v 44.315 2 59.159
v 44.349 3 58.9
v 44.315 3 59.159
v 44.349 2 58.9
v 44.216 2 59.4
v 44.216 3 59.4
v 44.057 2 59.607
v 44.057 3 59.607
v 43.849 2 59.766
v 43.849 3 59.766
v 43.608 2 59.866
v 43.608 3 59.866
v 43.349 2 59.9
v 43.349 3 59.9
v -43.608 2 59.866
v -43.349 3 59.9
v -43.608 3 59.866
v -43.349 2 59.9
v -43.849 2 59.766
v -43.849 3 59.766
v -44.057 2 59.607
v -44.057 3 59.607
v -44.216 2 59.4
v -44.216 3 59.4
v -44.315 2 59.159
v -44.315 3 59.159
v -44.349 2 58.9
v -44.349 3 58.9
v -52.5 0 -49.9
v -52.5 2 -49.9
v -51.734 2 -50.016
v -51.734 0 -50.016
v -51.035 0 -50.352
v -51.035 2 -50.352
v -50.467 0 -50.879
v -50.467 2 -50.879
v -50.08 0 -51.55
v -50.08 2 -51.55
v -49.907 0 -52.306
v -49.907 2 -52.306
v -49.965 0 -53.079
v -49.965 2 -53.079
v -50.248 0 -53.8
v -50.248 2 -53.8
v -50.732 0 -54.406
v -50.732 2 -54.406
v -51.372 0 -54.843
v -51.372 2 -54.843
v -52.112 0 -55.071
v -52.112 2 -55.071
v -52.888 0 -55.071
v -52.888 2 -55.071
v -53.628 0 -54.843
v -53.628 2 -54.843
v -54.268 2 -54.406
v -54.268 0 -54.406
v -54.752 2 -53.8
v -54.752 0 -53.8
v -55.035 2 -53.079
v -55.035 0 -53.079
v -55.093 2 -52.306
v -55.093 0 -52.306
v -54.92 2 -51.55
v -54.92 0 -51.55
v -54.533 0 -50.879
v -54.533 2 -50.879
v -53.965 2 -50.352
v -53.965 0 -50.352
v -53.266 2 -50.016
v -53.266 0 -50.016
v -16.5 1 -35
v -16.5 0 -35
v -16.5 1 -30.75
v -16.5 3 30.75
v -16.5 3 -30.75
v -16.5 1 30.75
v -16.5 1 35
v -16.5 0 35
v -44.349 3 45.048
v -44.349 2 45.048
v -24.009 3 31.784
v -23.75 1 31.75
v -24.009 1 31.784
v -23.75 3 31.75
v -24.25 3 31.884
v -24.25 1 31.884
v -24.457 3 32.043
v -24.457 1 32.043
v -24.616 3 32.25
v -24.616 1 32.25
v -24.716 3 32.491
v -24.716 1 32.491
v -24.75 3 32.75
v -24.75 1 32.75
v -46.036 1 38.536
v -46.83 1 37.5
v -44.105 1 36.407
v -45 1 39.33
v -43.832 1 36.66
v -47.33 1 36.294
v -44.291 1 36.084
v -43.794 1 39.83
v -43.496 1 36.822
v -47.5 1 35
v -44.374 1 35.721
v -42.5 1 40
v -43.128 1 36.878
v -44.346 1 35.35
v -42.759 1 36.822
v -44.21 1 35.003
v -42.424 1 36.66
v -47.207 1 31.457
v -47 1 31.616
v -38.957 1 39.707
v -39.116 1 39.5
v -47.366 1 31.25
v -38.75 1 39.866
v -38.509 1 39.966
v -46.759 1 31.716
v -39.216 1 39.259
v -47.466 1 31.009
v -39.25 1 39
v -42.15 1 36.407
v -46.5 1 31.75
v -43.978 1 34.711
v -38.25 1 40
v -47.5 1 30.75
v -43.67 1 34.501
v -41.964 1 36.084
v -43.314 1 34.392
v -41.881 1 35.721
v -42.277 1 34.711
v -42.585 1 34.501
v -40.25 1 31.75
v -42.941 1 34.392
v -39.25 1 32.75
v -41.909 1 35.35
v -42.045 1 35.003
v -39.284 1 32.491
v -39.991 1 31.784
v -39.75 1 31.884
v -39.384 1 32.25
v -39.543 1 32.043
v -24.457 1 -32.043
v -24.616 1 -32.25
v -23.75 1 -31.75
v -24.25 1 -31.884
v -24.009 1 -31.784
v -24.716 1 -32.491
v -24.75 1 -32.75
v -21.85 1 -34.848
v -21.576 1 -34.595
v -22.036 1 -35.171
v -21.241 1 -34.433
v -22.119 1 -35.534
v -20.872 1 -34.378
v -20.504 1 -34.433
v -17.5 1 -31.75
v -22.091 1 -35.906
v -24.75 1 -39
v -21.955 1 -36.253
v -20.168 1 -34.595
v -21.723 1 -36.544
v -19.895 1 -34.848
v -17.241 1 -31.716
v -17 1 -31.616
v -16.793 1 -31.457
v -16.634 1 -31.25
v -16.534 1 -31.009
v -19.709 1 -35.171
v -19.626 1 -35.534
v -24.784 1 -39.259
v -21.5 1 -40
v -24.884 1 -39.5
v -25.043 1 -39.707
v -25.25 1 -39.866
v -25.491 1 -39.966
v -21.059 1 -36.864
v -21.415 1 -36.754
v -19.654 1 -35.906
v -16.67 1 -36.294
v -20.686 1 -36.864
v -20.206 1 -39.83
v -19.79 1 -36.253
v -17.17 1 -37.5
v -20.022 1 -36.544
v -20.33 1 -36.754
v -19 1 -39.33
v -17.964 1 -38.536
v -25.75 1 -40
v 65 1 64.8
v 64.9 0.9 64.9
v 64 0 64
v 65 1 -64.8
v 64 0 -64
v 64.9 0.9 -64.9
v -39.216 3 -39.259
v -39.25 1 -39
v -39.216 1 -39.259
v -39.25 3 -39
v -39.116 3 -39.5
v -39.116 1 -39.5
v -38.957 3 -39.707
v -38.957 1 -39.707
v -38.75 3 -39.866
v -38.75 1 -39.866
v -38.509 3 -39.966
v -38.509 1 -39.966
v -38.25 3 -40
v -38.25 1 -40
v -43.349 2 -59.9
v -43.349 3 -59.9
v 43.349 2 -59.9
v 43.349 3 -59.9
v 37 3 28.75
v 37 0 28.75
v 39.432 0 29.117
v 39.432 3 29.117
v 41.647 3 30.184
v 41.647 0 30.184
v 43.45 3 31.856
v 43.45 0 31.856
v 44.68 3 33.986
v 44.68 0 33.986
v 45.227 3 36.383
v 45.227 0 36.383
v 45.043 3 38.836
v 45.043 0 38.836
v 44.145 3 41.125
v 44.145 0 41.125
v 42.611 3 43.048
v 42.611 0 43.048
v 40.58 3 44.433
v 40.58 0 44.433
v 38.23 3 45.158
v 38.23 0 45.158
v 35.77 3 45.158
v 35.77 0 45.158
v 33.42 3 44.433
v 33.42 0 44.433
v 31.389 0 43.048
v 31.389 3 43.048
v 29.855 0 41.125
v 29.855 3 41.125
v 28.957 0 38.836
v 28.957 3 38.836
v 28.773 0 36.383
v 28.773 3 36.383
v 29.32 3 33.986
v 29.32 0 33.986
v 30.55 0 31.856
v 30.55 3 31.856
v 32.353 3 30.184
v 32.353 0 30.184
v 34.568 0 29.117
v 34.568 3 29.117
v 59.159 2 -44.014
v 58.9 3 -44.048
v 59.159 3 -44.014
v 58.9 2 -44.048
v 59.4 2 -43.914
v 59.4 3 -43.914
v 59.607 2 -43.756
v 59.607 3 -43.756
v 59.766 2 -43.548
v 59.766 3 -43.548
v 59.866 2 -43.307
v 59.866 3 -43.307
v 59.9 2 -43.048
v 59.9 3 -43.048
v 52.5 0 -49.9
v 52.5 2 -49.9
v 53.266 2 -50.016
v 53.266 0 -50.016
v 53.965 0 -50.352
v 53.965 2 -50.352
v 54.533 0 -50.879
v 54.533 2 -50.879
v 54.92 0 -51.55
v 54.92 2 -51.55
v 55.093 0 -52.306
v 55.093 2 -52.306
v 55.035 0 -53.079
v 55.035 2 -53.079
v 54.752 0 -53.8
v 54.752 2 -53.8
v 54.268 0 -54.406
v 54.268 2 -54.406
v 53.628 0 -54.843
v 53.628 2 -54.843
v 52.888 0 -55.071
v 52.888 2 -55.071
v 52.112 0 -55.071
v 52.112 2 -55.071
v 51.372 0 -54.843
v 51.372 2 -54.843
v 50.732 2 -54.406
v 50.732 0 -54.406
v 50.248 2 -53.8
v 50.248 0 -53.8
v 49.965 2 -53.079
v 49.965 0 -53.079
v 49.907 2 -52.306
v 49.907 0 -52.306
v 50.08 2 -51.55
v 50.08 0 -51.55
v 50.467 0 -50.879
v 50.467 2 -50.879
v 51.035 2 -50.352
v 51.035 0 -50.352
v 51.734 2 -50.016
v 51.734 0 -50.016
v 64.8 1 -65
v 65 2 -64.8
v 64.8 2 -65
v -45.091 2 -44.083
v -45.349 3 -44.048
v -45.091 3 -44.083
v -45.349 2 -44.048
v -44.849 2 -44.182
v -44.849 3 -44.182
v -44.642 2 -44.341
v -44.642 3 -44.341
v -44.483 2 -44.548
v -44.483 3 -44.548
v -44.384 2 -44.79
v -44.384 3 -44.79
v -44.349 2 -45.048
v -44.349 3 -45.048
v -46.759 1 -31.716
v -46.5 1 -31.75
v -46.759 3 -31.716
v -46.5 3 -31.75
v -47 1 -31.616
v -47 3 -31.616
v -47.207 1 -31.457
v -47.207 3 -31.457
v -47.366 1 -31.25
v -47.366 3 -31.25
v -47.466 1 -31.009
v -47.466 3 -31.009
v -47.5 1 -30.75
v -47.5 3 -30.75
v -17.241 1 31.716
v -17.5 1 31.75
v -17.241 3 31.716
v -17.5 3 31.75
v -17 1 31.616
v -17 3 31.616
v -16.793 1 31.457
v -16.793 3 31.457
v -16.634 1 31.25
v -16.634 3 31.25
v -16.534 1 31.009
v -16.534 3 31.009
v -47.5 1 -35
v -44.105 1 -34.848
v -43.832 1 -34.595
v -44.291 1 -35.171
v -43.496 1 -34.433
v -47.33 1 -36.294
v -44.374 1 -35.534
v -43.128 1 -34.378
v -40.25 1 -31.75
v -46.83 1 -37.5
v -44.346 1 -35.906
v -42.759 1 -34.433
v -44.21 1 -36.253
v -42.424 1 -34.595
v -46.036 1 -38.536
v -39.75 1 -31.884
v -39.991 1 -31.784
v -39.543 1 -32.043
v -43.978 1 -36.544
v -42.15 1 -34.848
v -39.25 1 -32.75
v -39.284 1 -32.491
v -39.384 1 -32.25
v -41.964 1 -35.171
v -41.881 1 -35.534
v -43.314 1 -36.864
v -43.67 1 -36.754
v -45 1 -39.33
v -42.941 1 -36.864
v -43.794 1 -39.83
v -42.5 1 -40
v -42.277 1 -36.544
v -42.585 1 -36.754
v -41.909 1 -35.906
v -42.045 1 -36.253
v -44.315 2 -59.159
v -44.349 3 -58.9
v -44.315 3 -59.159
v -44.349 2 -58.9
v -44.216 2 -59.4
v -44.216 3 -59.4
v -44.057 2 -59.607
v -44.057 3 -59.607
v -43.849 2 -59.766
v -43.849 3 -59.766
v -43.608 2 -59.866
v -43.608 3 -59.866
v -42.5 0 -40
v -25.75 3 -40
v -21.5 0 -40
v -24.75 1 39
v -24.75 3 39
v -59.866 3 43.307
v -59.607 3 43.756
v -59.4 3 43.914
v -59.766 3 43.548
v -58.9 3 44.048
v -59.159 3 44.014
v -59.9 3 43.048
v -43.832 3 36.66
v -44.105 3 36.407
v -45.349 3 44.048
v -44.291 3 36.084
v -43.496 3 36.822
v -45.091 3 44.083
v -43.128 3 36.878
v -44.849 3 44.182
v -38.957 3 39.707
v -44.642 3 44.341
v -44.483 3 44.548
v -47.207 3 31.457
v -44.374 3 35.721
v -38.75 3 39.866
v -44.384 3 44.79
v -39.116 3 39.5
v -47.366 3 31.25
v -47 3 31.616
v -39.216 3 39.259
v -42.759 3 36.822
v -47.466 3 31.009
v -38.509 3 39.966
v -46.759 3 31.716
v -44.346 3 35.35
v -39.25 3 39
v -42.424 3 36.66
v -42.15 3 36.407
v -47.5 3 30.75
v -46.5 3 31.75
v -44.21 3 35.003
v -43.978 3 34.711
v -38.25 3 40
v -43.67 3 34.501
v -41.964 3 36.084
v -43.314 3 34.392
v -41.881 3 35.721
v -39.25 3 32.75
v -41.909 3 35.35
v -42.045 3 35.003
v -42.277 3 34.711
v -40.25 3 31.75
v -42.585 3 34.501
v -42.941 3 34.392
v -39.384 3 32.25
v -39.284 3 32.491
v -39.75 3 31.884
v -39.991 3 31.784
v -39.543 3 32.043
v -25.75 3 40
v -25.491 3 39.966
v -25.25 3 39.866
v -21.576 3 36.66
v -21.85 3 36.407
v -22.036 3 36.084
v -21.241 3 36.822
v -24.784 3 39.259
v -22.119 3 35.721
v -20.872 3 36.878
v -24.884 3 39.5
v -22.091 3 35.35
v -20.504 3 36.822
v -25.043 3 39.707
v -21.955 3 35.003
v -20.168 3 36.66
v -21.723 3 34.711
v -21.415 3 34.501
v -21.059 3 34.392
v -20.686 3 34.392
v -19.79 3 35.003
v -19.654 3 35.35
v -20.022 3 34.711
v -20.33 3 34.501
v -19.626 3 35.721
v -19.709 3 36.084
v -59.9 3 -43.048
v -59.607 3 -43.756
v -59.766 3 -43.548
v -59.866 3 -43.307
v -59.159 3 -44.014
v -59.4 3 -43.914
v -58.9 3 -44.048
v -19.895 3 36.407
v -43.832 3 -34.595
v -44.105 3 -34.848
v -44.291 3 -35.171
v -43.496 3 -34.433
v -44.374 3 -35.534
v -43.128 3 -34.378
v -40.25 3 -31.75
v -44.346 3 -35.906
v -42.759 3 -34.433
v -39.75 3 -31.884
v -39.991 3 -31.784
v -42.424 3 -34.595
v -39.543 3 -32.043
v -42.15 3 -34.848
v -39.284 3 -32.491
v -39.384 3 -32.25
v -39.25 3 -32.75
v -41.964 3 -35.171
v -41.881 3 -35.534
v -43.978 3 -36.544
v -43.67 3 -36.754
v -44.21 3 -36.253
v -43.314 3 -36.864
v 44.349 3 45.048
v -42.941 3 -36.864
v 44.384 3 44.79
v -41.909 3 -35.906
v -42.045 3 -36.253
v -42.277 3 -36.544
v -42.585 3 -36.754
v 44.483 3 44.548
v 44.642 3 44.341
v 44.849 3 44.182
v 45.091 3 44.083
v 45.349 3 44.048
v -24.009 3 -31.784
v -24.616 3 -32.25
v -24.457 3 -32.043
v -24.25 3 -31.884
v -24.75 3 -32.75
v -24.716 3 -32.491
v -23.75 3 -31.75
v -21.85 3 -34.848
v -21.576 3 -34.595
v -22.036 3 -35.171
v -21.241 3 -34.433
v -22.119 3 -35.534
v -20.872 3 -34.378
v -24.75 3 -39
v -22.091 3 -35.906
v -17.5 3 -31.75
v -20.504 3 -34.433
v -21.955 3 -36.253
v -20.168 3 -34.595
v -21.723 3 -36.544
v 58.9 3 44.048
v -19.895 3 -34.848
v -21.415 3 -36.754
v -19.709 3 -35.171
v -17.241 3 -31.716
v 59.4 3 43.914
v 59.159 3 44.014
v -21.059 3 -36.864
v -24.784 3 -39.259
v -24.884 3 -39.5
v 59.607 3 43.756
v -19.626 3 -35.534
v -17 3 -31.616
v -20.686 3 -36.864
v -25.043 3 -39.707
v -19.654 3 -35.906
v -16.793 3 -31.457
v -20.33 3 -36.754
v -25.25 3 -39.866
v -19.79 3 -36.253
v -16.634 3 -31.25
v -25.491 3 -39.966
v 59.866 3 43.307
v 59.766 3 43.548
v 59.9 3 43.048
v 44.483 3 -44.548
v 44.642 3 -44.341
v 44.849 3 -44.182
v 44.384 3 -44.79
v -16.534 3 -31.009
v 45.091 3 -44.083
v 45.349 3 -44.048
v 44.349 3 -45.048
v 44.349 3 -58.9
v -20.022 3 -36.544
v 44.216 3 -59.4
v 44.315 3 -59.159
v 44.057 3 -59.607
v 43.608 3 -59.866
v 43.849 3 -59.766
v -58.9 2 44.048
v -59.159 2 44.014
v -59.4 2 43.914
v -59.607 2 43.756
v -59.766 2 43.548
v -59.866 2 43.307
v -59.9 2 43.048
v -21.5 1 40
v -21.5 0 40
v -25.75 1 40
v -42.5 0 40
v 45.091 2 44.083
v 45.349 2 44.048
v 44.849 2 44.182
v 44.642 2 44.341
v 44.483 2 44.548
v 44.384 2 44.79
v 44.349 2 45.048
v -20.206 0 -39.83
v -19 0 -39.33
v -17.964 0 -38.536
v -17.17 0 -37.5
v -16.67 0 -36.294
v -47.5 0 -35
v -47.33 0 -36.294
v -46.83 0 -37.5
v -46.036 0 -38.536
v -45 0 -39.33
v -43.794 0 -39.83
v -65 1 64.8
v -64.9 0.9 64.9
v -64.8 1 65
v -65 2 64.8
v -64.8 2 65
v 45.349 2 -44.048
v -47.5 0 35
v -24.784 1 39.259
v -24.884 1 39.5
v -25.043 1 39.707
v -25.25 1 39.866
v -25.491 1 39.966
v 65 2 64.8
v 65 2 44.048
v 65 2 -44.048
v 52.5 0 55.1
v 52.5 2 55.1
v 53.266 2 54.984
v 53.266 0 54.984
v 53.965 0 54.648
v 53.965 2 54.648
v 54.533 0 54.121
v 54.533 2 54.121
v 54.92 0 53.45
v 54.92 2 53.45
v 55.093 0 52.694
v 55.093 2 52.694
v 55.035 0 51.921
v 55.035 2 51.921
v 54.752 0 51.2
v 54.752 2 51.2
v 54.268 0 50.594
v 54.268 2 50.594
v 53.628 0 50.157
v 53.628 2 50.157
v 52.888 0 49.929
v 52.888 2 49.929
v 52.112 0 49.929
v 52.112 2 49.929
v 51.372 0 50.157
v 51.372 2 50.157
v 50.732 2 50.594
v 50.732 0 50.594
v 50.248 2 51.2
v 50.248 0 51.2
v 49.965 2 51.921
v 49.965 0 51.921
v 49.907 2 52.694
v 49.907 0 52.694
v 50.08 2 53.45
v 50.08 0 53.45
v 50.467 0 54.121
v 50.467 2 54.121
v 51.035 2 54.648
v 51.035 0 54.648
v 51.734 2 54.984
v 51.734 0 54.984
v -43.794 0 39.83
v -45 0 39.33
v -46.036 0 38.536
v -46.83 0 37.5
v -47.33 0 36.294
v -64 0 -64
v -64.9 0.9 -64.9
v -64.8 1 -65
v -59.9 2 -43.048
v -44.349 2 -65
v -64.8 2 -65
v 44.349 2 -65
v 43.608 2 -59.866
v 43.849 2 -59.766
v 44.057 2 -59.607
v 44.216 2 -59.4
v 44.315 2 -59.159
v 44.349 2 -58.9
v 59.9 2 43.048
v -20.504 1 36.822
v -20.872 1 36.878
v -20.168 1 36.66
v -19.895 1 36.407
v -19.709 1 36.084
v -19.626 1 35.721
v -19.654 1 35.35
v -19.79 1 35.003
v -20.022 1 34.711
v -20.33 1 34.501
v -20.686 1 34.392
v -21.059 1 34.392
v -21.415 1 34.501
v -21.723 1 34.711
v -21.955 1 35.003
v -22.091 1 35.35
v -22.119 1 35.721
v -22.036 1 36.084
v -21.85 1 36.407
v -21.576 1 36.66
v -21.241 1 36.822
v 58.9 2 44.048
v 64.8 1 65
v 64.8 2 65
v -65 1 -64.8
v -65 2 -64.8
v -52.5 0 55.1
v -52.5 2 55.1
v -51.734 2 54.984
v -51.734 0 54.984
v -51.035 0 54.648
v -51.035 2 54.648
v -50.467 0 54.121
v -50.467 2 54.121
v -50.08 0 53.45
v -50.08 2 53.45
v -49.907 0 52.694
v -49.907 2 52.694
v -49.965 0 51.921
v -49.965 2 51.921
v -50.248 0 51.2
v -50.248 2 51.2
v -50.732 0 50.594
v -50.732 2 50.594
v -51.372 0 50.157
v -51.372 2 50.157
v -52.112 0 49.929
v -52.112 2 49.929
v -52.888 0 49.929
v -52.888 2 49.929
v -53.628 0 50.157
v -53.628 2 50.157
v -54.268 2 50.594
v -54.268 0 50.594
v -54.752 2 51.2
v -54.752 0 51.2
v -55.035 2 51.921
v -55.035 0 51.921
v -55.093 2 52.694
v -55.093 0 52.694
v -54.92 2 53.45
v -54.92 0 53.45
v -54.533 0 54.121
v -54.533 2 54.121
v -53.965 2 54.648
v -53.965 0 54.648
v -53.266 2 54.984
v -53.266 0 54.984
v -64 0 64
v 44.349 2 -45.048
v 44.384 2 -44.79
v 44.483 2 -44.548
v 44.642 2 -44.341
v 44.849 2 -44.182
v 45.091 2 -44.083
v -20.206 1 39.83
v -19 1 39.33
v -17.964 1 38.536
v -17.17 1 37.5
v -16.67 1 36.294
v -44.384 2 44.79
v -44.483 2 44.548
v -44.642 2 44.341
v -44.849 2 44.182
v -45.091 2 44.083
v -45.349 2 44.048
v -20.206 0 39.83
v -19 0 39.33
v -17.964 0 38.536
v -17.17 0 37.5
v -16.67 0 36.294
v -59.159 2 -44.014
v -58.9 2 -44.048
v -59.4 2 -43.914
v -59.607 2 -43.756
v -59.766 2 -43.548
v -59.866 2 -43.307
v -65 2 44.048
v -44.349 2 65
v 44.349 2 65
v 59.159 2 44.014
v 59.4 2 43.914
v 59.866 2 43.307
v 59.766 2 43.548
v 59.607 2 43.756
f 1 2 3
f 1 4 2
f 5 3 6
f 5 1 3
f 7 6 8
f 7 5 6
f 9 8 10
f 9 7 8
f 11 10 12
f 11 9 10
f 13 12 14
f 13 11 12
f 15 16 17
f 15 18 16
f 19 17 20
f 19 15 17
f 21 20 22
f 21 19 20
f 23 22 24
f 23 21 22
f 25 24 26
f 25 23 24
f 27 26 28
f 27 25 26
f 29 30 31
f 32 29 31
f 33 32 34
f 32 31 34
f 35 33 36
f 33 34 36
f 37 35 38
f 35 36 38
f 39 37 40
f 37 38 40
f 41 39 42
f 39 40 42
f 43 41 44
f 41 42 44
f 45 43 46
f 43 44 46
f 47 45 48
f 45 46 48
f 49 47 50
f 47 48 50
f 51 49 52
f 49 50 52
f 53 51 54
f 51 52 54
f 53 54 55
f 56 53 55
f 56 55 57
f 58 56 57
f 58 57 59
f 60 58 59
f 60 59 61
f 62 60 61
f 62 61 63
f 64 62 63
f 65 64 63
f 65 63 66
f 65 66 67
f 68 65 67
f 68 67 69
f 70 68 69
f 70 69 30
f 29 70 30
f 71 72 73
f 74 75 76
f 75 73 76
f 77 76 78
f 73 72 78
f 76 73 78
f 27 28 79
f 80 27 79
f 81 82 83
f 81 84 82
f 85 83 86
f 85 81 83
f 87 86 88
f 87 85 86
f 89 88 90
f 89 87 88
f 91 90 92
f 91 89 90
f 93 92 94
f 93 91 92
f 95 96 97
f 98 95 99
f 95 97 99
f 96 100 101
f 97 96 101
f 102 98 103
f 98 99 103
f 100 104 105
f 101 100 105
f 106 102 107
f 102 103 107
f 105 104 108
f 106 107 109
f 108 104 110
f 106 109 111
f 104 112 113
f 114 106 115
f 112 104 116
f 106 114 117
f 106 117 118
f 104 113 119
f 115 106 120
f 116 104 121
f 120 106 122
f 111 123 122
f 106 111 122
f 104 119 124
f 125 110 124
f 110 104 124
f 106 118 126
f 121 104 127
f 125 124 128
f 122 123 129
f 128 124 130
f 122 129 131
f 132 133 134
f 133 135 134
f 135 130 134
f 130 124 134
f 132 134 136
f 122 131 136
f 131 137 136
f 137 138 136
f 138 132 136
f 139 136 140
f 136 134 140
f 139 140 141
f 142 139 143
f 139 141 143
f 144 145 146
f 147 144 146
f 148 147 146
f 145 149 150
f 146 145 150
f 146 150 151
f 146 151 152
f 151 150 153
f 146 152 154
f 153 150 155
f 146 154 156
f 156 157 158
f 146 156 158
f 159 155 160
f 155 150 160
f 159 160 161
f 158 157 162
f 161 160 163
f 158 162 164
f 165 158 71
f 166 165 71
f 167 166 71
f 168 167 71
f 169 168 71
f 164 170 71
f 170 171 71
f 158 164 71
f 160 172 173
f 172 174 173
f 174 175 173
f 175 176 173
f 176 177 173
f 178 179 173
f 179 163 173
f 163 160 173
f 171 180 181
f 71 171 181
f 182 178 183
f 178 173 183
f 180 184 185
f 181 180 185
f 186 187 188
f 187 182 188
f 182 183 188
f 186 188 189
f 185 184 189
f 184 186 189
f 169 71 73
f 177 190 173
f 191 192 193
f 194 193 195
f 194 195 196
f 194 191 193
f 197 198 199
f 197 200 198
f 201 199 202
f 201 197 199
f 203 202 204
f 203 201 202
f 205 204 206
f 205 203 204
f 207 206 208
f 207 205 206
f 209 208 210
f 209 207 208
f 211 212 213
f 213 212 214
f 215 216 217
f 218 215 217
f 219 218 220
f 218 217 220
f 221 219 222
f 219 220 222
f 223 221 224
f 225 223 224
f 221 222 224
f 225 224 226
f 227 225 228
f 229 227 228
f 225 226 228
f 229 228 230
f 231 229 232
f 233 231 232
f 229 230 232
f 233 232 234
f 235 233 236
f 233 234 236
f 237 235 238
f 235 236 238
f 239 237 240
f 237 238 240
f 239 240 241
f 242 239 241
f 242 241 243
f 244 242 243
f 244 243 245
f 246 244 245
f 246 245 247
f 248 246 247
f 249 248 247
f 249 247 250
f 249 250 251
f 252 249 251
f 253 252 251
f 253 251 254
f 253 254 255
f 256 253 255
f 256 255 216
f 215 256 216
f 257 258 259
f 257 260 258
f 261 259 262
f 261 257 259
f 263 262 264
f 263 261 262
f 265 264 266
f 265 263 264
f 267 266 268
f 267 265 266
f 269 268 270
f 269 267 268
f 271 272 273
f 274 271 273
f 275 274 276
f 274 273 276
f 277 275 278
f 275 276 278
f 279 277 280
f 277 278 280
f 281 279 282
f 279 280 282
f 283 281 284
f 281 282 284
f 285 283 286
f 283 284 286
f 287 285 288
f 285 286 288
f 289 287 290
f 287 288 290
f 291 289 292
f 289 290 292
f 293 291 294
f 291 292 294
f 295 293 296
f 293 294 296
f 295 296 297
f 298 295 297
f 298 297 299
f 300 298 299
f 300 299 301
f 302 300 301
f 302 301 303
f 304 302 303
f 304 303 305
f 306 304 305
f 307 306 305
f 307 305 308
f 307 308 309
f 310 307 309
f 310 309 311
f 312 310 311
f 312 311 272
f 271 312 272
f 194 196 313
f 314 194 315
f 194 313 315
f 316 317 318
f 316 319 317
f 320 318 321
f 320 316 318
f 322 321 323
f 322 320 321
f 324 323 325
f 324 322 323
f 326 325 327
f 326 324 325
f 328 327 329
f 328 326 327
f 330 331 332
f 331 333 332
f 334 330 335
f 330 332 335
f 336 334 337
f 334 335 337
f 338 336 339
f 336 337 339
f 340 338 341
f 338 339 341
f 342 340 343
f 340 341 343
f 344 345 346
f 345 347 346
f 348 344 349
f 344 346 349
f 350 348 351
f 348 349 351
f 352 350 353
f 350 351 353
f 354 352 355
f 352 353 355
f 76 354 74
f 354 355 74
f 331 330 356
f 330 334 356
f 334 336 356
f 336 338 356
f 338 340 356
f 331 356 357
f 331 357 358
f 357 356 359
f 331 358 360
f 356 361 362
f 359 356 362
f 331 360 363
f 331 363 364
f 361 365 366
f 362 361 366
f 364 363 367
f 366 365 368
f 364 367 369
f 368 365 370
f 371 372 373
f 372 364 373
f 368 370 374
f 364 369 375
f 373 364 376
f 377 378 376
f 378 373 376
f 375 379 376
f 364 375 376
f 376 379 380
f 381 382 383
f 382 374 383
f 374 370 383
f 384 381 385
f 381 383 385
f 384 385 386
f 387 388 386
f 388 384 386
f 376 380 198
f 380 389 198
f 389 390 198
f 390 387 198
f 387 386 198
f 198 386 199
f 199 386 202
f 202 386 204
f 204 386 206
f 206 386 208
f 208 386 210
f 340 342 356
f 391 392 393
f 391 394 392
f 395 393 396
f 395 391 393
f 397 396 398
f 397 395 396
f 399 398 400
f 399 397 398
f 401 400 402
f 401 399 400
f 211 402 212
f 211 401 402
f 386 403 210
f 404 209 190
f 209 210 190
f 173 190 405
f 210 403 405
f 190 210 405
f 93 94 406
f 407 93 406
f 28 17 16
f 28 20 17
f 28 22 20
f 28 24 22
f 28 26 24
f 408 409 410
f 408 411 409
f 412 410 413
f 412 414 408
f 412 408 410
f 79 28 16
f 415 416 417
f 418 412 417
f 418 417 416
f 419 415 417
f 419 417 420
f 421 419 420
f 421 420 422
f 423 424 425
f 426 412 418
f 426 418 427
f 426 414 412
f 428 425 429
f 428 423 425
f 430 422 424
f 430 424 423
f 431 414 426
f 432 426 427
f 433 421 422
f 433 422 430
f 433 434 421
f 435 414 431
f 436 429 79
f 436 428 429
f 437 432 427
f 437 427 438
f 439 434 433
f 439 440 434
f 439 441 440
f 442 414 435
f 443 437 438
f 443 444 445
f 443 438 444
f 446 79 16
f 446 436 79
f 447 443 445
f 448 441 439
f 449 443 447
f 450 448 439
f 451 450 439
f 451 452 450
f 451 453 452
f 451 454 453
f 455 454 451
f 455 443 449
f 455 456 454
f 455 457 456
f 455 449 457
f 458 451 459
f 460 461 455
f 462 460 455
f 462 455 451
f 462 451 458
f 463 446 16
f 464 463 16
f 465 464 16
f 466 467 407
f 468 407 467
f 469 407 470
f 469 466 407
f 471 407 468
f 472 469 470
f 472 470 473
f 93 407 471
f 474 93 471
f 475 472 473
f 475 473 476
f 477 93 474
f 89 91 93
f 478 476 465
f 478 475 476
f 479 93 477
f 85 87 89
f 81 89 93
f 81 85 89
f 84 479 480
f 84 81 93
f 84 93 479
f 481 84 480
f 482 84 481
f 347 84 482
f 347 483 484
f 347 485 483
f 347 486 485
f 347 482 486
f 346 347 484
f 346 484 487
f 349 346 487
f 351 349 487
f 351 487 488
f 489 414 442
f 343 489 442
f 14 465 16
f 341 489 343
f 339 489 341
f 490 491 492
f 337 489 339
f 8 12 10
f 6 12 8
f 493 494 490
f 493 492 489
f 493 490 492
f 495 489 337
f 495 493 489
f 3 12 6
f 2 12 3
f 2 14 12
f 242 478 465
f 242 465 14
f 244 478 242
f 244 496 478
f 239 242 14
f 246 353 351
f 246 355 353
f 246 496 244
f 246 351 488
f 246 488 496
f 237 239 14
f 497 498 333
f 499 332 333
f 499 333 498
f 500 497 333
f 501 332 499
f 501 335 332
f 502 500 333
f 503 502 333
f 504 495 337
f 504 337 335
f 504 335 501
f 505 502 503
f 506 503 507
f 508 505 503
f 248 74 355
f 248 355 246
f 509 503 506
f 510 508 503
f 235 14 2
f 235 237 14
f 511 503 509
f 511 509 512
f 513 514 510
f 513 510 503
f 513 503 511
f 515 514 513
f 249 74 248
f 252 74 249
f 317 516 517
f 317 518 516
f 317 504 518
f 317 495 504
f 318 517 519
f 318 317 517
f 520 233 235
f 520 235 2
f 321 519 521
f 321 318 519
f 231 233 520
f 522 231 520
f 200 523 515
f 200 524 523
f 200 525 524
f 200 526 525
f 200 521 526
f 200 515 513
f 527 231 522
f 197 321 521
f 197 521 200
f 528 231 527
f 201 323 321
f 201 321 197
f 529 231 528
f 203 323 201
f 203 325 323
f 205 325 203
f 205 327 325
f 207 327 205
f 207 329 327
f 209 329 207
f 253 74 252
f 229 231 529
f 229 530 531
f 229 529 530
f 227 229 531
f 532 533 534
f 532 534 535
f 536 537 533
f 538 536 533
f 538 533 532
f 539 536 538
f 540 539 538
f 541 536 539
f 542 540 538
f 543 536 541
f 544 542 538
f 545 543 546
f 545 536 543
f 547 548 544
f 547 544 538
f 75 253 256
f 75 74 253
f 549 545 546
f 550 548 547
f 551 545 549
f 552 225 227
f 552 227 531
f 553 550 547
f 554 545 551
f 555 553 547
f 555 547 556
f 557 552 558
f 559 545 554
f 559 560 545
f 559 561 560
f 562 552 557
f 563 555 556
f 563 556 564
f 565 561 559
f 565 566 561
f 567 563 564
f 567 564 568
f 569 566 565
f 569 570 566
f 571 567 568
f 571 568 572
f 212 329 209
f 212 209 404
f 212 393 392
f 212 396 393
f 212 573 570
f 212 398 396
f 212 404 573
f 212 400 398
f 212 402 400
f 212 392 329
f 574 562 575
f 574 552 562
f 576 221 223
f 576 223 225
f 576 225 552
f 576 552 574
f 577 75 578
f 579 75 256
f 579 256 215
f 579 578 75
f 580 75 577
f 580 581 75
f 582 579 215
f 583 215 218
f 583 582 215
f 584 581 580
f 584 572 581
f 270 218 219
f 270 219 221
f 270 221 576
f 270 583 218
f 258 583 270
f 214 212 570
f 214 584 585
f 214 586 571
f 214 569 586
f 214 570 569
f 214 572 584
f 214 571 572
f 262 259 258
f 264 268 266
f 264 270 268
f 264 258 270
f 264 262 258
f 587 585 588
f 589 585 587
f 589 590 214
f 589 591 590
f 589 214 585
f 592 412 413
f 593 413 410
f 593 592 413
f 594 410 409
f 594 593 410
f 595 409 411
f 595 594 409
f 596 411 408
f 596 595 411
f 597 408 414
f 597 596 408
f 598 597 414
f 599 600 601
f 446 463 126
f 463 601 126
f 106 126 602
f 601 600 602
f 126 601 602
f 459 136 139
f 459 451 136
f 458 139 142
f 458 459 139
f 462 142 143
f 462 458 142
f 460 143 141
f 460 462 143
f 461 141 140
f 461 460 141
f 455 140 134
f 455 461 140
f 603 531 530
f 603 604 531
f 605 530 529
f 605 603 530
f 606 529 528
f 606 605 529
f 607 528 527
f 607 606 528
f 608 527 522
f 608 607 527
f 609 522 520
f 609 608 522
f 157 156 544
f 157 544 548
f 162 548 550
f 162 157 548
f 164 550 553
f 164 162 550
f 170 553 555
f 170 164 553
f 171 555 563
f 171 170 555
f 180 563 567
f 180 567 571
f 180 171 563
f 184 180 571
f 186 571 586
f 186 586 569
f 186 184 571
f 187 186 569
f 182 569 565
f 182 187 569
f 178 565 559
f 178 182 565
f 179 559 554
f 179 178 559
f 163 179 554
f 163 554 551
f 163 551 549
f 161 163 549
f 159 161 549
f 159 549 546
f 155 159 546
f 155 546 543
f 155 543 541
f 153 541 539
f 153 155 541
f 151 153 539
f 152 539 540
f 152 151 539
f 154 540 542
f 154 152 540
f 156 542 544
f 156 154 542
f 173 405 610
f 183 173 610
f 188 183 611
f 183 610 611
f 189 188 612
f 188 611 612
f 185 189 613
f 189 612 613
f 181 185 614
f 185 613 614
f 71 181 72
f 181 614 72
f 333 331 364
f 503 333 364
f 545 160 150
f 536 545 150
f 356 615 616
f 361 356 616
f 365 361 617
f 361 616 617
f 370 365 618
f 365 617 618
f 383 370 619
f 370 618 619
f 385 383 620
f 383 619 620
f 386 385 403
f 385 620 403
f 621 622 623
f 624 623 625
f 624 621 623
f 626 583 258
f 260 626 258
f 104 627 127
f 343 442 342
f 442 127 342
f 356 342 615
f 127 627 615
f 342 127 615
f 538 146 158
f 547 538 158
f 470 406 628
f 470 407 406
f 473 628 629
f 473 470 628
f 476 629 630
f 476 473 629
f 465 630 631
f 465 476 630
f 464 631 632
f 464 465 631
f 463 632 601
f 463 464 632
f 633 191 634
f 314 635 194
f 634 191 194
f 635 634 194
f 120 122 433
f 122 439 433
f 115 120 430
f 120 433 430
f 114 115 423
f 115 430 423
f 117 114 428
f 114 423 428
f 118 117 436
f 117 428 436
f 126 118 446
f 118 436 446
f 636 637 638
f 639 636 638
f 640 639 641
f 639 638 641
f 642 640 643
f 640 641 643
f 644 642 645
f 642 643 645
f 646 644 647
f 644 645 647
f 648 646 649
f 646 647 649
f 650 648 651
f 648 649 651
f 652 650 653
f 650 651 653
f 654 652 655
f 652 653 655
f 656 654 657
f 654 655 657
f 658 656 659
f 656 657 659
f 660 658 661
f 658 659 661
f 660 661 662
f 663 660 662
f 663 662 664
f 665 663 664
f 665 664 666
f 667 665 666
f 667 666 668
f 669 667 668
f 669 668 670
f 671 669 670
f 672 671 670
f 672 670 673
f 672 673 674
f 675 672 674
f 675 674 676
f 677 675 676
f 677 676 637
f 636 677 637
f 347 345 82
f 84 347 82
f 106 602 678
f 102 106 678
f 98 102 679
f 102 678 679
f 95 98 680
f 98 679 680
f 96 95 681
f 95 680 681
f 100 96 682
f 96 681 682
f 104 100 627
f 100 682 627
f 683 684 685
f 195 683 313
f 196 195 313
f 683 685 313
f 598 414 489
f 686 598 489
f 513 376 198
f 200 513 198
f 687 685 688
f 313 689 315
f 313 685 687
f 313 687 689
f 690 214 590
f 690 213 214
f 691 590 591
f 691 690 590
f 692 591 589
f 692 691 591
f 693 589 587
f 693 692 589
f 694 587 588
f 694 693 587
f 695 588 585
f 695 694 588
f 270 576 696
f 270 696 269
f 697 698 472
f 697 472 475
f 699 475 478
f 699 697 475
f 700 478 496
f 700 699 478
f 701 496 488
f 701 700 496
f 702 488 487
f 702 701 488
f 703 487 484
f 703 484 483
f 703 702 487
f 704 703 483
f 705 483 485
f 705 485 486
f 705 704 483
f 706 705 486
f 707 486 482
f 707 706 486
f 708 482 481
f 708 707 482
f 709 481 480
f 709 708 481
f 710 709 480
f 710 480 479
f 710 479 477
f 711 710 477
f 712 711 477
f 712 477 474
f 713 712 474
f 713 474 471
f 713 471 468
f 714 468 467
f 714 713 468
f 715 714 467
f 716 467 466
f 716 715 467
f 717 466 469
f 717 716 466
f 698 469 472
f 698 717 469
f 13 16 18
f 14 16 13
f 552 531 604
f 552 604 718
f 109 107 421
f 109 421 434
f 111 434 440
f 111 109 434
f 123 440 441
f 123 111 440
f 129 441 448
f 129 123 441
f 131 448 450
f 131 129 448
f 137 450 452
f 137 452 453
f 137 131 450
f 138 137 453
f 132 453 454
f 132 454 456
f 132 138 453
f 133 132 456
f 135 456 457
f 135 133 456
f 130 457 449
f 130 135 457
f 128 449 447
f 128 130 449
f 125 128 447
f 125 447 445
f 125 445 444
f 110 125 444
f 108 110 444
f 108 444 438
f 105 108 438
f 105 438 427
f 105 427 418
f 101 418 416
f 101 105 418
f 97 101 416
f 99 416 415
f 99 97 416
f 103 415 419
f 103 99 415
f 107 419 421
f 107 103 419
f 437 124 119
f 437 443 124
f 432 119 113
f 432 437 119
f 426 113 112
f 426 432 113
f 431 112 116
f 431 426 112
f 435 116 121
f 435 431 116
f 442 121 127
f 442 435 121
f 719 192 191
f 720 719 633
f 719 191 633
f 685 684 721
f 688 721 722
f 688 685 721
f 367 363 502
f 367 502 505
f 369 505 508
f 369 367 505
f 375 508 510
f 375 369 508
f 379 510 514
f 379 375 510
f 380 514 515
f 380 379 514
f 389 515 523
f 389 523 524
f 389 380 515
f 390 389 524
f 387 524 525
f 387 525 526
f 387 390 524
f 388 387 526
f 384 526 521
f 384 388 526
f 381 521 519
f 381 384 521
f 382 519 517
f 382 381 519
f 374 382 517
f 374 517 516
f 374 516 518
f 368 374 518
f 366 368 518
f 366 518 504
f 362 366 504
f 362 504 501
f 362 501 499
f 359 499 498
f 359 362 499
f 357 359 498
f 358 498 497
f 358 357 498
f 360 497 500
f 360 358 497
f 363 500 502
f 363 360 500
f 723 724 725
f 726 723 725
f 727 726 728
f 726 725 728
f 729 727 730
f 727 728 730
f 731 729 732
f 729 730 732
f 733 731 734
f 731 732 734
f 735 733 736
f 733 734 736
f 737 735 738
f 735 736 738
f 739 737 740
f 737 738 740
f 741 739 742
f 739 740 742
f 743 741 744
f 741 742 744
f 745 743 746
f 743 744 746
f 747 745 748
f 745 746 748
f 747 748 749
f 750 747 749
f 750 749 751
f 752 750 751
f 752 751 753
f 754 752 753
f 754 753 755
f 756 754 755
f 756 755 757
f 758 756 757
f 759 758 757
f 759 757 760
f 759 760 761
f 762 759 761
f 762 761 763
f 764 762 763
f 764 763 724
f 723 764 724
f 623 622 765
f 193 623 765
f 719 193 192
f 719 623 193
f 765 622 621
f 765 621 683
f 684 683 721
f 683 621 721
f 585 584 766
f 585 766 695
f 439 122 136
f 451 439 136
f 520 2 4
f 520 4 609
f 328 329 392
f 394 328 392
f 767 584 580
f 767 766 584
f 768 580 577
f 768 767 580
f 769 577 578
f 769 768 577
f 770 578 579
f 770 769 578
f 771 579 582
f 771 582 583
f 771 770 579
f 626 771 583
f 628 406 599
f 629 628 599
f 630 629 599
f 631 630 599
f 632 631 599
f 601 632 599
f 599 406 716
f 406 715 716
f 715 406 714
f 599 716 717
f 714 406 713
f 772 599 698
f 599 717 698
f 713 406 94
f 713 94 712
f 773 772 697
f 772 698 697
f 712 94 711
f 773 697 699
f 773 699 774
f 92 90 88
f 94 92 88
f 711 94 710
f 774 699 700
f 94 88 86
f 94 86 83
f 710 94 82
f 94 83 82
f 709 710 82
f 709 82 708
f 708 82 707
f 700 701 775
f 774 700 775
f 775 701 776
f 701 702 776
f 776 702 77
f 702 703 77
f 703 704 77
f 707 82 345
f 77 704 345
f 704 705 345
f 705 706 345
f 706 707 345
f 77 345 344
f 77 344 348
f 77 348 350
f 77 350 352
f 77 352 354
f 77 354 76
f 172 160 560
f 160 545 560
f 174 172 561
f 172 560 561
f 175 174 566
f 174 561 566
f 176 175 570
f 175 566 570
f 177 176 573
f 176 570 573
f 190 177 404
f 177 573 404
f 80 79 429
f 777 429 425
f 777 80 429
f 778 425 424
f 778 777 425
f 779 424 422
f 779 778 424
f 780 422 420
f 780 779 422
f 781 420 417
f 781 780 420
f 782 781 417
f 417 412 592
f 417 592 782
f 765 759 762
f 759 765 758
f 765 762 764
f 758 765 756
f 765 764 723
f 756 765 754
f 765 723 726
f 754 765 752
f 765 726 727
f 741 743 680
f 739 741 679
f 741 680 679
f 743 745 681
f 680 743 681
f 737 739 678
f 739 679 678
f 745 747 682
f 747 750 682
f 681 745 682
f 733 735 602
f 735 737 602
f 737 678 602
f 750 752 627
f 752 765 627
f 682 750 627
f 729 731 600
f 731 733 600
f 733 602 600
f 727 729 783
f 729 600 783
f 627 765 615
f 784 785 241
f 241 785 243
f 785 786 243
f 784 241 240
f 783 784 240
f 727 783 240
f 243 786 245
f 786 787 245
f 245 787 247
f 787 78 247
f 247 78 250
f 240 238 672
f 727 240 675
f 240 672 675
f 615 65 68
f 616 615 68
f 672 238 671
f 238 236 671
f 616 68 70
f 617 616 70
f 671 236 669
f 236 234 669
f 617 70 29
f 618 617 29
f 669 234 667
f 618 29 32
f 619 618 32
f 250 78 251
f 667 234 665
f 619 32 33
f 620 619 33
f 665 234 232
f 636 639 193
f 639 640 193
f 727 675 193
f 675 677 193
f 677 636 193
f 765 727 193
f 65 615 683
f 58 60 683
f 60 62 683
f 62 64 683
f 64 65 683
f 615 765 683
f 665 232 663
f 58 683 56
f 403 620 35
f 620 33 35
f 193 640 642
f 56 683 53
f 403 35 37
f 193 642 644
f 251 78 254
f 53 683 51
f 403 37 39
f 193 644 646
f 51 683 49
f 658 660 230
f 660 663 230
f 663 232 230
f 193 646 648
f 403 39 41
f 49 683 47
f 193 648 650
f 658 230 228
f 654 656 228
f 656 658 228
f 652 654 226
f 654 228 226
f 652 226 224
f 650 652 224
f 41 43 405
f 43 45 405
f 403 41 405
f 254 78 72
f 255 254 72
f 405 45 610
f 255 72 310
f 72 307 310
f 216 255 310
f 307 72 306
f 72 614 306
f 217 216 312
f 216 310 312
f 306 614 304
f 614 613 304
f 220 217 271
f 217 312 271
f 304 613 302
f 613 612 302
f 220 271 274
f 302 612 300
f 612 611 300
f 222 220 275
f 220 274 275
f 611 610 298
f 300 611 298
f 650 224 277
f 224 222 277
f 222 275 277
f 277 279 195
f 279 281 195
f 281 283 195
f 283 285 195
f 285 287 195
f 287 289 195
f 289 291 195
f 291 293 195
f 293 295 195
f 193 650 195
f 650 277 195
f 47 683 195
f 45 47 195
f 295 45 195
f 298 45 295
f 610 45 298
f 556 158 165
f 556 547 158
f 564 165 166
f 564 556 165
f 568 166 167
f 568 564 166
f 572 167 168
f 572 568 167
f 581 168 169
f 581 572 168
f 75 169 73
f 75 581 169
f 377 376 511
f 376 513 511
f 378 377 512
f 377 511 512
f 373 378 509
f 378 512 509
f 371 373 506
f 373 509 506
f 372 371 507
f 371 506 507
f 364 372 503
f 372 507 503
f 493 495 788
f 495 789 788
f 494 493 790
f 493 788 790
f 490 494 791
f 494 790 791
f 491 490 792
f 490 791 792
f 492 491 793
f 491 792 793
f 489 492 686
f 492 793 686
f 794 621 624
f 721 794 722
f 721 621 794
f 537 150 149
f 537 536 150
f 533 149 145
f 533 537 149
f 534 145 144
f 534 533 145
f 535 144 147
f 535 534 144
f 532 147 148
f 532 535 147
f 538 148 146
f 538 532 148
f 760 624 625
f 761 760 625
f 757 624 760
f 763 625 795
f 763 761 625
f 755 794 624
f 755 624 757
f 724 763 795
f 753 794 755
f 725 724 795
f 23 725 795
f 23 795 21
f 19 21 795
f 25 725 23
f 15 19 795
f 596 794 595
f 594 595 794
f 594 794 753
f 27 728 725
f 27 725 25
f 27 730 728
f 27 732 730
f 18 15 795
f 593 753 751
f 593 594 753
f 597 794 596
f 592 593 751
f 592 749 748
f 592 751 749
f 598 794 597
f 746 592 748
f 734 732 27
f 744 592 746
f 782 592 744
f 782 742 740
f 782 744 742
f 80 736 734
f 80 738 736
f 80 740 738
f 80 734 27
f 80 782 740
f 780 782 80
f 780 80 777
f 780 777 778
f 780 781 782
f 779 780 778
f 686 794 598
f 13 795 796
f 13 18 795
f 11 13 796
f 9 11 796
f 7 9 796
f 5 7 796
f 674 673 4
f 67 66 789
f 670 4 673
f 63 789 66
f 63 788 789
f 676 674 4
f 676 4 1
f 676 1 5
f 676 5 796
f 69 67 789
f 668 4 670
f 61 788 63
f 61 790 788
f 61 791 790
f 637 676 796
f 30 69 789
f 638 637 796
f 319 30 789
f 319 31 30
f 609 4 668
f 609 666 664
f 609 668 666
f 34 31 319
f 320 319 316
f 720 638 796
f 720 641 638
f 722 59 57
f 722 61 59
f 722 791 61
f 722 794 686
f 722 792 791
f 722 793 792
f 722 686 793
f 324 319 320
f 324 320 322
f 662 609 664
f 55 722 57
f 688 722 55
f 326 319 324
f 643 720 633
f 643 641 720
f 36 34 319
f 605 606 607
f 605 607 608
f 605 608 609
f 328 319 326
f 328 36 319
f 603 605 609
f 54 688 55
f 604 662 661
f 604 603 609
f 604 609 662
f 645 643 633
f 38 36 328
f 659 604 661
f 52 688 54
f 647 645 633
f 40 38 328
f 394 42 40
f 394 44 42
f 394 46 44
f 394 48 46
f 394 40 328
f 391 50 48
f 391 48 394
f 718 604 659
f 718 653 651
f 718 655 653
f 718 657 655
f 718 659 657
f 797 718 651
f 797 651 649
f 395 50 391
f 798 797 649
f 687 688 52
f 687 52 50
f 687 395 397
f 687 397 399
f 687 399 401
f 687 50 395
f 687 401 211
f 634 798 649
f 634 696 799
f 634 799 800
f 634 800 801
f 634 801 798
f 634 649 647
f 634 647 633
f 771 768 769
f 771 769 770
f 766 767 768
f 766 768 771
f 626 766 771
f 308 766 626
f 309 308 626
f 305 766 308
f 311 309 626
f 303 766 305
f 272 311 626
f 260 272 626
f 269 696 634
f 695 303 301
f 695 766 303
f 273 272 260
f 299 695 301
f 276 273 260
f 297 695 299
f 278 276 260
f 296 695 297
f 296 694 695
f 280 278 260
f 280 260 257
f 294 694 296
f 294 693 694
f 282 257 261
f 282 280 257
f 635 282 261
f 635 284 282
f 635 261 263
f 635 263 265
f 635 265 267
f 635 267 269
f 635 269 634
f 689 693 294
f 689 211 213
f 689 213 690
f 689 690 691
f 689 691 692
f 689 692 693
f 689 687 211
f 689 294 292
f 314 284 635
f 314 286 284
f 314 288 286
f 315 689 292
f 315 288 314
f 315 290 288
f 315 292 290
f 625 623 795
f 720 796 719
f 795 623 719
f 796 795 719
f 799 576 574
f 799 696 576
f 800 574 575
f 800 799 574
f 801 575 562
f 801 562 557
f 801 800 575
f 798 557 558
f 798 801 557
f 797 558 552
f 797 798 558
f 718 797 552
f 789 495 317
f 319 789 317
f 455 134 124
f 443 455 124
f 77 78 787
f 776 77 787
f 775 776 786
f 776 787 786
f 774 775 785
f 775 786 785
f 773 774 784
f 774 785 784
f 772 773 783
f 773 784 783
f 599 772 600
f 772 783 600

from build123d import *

# Parameters (mm, degrees)
SKETCH_1_W          = 130
SKETCH_1_H          = 130
EXTRUDE_1_DEPTH     = 3
SKETCH_2_R          = 2.6
CUT_EXTRUDE_1_DEPTH = 92.972822073
SKETCH_4_W          = 20.650518397
SKETCH_4_H          = 20.951555191
CUT_EXTRUDE_2_DEPTH = 1
SKETCH_5_W          = 88.698963206
SKETCH_5_H          = 5.1
SKETCH_5_W_2        = 5.1
SKETCH_5_H_2        = 88.096889618
CUT_EXTRUDE_3_DEPTH = 1
CUT_EXTRUDE_4_DEPTH = 3
EXTRUDE_START       = -2
SKETCH_7_R          = 1.25
EXTRUDE_2_DEPTH     = 2
FILLET_1_R          = 1
SKETCH_15_R         = 8.25
CUT_EXTRUDE_9_DEPTH = 92.972822073
CHAMFER_1_SIZE      = 1
CHAMFER_2_SIZE      = 0.2
FILLET_3_R          = 1
FILLET_4_R          = 1


with BuildPart() as part:
    # 草图1 → 凸台-拉伸1 (new body)
    with BuildSketch(Plane(origin=(0, 0, 0), x_dir=(1, 0, 0), z_dir=(0, 1, 0))):
        Rectangle(SKETCH_1_W, SKETCH_1_H)
    extrude(amount=EXTRUDE_1_DEPTH)

    # 草图2 → 切除-拉伸1 (cut, through all)
    with BuildSketch(Plane(origin=(0, 3, 0), x_dir=(1, 0, 0), z_dir=(0, 1, 0))):
        with Locations(Location((52.5, 52.5, 0), (0, 0, 270))):
            Circle(SKETCH_2_R)
        with Locations(Location((52.5, -52.5, 0), (0, 0, 270))):
            Circle(SKETCH_2_R)
        with Locations(Location((-52.5, -52.5, 0), (0, 0, 270))):
            Circle(SKETCH_2_R)
        with Locations(Location((-52.5, 52.5, 0), (0, 0, 270))):
            Circle(SKETCH_2_R)
    extrude(amount=-CUT_EXTRUDE_1_DEPTH, mode=Mode.SUBTRACT)

    # 草图4 → 切除-拉伸2 (cut)
    with BuildSketch(Plane(origin=(0, 3, 0), x_dir=(1, 0, 0), z_dir=(0, 1, 0))):
        with Locations((54.674740802, 54.524222405)):
            Rectangle(SKETCH_4_W, SKETCH_4_H)
        with Locations((-54.674740802, -54.524222405)):
            Rectangle(SKETCH_4_W, SKETCH_4_H)
        with Locations((54.674740802, -54.524222405)):
            Rectangle(SKETCH_4_W, SKETCH_4_H)
        with Locations((-54.674740802, 54.524222405)):
            Rectangle(SKETCH_4_W, SKETCH_4_H)
    extrude(amount=-CUT_EXTRUDE_2_DEPTH, mode=Mode.SUBTRACT)

    # 草图5 → 切除-拉伸3 (cut)
    with BuildSketch(Plane(origin=(0, 3, 0), x_dir=(1, 0, 0), z_dir=(0, 1, 0))):
        with Locations((0, 62.45)):
            Rectangle(SKETCH_5_W, SKETCH_5_H)
        with Locations((62.45, 0)):
            Rectangle(SKETCH_5_W_2, SKETCH_5_H_2)
        with Locations((0, -62.45)):
            Rectangle(SKETCH_5_W, SKETCH_5_H)
        with Locations((-62.45, 0)):
            Rectangle(SKETCH_5_W_2, SKETCH_5_H_2)
    extrude(amount=-CUT_EXTRUDE_3_DEPTH, mode=Mode.SUBTRACT)

    # 草图6 → 切除-拉伸4 (cut)
    with BuildSketch(Plane(origin=(0, 0, 0), x_dir=(-1, 0, 0), z_dir=(0, -1, 0))):
        with BuildLine():
            Line((47.5, -35), (47.5, 35))
            ThreePointArc((47.5, 35), (46.035533906, 38.535533906), (42.5, 40))
            Line((42.5, 40), (21.5, 40))
            ThreePointArc((21.5, 40), (17.964466094, 38.535533906), (16.5, 35))
            Line((16.5, 35), (16.5, -35))
            ThreePointArc((16.5, -35), (17.964466094, -38.535533906), (21.5, -40))
            Line((21.5, -40), (42.5, -40))
            ThreePointArc((42.5, -40), (46.035533906, -38.535533906), (47.5, -35))
        make_face()
    extrude(amount=-CUT_EXTRUDE_4_DEPTH, mode=Mode.SUBTRACT)

    # 草图7 → 凸台-拉伸2 (add)
    # profile 1 of 4: a face of its own
    with BuildSketch(Plane(origin=(0, 3, 0), x_dir=(1, 0, 0), z_dir=(0, 1, 0)).offset(EXTRUDE_START)):
        with BuildLine():
            Line((-24.75, 40), (-24.75, 31.75))
            Line((-24.75, 31.75), (-16.5, 31.75))
            Line((-16.5, 31.75), (-16.5, 35))
            ThreePointArc((-16.5, 35), (-17.964466094, 38.535533906), (-21.5, 40))
            Line((-21.5, 40), (-24.75, 40))
        make_face()
        with Locations(Location((-20.872307757, 35.627692243, 0), (0, 0, 270))):
            Circle(SKETCH_7_R, mode=Mode.SUBTRACT)
    # profile 2 of 4: a face of its own
    with BuildSketch(Plane(origin=(0, 3, 0), x_dir=(1, 0, 0), z_dir=(0, 1, 0)).offset(EXTRUDE_START)):
        with BuildLine():
            Line((-16.5, -31.75), (-24.75, -31.75))
            Line((-24.75, -31.75), (-24.75, -40))
            Line((-24.75, -40), (-21.5, -40))
            ThreePointArc((-21.5, -40), (-17.964466094, -38.535533906), (-16.5, -35))
            Line((-16.5, -35), (-16.5, -31.75))
        make_face()
        with Locations(Location((-20.872307757, -35.627692243, 0), (0, 0, 270))):
            Circle(SKETCH_7_R, mode=Mode.SUBTRACT)
    # profile 3 of 4: a face of its own
    with BuildSketch(Plane(origin=(0, 3, 0), x_dir=(1, 0, 0), z_dir=(0, 1, 0)).offset(EXTRUDE_START)):
        with BuildLine():
            Line((-39.25, -40), (-39.25, -31.75))
            Line((-39.25, -31.75), (-47.5, -31.75))
            Line((-47.5, -31.75), (-47.5, -35))
            ThreePointArc((-47.5, -35), (-46.035533906, -38.535533906), (-42.5, -40))
            Line((-42.5, -40), (-39.25, -40))
        make_face()
        with Locations(Location((-43.127692243, -35.627692243, 0), (0, 0, 270))):
            Circle(SKETCH_7_R, mode=Mode.SUBTRACT)
    # profile 4 of 4: a face of its own
    with BuildSketch(Plane(origin=(0, 3, 0), x_dir=(1, 0, 0), z_dir=(0, 1, 0)).offset(EXTRUDE_START)):
        with BuildLine():
            Line((-47.5, 31.75), (-39.25, 31.75))
            Line((-39.25, 31.75), (-39.25, 40))
            Line((-39.25, 40), (-42.5, 40))
            ThreePointArc((-42.5, 40), (-46.035533906, 38.535533906), (-47.5, 35))
            Line((-47.5, 35), (-47.5, 31.75))
        make_face()
        with Locations(Location((-43.127692243, 35.627692243, 0), (0, 0, 270))):
            Circle(SKETCH_7_R, mode=Mode.SUBTRACT)
    extrude(amount=EXTRUDE_2_DEPTH)

    # 圆角1
    fillet_1_edges = [part.edges().sort_by_distance(p)[0] for p in [
        (-24.75, 2, -31.75),
        (-39.25, 2, -31.75),
        (-39.25, 2, 31.75),
        (-24.75, 2, 31.75),
    ]]
    fillet(fillet_1_edges, radius=FILLET_1_R)

    # 草图15 → 切除-拉伸9 (cut, through all)
    with BuildSketch(Plane(origin=(0, 0, 0), x_dir=(-1, 0, 0), z_dir=(0, -1, 0))):
        with Locations(Location((-37, -37, 0), (0, 0, 90))):
            Circle(SKETCH_15_R)
    extrude(amount=-CUT_EXTRUDE_9_DEPTH, mode=Mode.SUBTRACT)

    # 倒角1
    chamfer_1_edges = [part.edges().sort_by_distance(p)[0] for p in [
        (0, 0, 65),
        (-65, 0, 0),
        (0, 0, -65),
        (65, 0, 0),
    ]]
    chamfer(chamfer_1_edges, length=CHAMFER_1_SIZE)

    # 倒角2
    chamfer_2_edges = [part.edges().sort_by_distance(p)[0] for p in [
        (65, 1.5, 65),
        (-65, 1.5, 65),
        (-65, 1.5, -65),
        (65, 1.5, -65),
    ]]
    chamfer(chamfer_2_edges, length=CHAMFER_2_SIZE)

    # 圆角3
    fillet_3_edges = [part.edges().sort_by_distance(p)[0] for p in [
        (59.9, 2.5, 44.048444809),
        (59.9, 2.5, -44.048444809),
        (-44.349481603, 2.5, -59.9),
        (44.349481603, 2.5, -59.9),
        (44.349481603, 2.5, 59.9),
        (-44.349481603, 2.5, 59.9),
        (-59.9, 2.5, 44.048444809),
        (-59.9, 2.5, -44.048444809),
        (-44.349481603, 2.5, -44.048444809),
        (-44.349481603, 2.5, 44.048444809),
        (44.349481603, 2.5, 44.048444809),
        (44.349481603, 2.5, -44.048444809),
    ]]
    fillet(fillet_3_edges, radius=FILLET_3_R)

    # 圆角4
    fillet_4_edges = [part.edges().sort_by_distance(p)[0] for p in [
        (-24.75, 2, -40),
        (-16.5, 2, -31.75),
        (-47.5, 2, -31.75),
        (-39.25, 2, -40),
        (-39.25, 2, 40),
        (-47.5, 2, 31.75),
        (-16.5, 2, 31.75),
        (-24.75, 2, 40),
    ]]
    fillet(fillet_4_edges, radius=FILLET_4_R)


solid = part.part
